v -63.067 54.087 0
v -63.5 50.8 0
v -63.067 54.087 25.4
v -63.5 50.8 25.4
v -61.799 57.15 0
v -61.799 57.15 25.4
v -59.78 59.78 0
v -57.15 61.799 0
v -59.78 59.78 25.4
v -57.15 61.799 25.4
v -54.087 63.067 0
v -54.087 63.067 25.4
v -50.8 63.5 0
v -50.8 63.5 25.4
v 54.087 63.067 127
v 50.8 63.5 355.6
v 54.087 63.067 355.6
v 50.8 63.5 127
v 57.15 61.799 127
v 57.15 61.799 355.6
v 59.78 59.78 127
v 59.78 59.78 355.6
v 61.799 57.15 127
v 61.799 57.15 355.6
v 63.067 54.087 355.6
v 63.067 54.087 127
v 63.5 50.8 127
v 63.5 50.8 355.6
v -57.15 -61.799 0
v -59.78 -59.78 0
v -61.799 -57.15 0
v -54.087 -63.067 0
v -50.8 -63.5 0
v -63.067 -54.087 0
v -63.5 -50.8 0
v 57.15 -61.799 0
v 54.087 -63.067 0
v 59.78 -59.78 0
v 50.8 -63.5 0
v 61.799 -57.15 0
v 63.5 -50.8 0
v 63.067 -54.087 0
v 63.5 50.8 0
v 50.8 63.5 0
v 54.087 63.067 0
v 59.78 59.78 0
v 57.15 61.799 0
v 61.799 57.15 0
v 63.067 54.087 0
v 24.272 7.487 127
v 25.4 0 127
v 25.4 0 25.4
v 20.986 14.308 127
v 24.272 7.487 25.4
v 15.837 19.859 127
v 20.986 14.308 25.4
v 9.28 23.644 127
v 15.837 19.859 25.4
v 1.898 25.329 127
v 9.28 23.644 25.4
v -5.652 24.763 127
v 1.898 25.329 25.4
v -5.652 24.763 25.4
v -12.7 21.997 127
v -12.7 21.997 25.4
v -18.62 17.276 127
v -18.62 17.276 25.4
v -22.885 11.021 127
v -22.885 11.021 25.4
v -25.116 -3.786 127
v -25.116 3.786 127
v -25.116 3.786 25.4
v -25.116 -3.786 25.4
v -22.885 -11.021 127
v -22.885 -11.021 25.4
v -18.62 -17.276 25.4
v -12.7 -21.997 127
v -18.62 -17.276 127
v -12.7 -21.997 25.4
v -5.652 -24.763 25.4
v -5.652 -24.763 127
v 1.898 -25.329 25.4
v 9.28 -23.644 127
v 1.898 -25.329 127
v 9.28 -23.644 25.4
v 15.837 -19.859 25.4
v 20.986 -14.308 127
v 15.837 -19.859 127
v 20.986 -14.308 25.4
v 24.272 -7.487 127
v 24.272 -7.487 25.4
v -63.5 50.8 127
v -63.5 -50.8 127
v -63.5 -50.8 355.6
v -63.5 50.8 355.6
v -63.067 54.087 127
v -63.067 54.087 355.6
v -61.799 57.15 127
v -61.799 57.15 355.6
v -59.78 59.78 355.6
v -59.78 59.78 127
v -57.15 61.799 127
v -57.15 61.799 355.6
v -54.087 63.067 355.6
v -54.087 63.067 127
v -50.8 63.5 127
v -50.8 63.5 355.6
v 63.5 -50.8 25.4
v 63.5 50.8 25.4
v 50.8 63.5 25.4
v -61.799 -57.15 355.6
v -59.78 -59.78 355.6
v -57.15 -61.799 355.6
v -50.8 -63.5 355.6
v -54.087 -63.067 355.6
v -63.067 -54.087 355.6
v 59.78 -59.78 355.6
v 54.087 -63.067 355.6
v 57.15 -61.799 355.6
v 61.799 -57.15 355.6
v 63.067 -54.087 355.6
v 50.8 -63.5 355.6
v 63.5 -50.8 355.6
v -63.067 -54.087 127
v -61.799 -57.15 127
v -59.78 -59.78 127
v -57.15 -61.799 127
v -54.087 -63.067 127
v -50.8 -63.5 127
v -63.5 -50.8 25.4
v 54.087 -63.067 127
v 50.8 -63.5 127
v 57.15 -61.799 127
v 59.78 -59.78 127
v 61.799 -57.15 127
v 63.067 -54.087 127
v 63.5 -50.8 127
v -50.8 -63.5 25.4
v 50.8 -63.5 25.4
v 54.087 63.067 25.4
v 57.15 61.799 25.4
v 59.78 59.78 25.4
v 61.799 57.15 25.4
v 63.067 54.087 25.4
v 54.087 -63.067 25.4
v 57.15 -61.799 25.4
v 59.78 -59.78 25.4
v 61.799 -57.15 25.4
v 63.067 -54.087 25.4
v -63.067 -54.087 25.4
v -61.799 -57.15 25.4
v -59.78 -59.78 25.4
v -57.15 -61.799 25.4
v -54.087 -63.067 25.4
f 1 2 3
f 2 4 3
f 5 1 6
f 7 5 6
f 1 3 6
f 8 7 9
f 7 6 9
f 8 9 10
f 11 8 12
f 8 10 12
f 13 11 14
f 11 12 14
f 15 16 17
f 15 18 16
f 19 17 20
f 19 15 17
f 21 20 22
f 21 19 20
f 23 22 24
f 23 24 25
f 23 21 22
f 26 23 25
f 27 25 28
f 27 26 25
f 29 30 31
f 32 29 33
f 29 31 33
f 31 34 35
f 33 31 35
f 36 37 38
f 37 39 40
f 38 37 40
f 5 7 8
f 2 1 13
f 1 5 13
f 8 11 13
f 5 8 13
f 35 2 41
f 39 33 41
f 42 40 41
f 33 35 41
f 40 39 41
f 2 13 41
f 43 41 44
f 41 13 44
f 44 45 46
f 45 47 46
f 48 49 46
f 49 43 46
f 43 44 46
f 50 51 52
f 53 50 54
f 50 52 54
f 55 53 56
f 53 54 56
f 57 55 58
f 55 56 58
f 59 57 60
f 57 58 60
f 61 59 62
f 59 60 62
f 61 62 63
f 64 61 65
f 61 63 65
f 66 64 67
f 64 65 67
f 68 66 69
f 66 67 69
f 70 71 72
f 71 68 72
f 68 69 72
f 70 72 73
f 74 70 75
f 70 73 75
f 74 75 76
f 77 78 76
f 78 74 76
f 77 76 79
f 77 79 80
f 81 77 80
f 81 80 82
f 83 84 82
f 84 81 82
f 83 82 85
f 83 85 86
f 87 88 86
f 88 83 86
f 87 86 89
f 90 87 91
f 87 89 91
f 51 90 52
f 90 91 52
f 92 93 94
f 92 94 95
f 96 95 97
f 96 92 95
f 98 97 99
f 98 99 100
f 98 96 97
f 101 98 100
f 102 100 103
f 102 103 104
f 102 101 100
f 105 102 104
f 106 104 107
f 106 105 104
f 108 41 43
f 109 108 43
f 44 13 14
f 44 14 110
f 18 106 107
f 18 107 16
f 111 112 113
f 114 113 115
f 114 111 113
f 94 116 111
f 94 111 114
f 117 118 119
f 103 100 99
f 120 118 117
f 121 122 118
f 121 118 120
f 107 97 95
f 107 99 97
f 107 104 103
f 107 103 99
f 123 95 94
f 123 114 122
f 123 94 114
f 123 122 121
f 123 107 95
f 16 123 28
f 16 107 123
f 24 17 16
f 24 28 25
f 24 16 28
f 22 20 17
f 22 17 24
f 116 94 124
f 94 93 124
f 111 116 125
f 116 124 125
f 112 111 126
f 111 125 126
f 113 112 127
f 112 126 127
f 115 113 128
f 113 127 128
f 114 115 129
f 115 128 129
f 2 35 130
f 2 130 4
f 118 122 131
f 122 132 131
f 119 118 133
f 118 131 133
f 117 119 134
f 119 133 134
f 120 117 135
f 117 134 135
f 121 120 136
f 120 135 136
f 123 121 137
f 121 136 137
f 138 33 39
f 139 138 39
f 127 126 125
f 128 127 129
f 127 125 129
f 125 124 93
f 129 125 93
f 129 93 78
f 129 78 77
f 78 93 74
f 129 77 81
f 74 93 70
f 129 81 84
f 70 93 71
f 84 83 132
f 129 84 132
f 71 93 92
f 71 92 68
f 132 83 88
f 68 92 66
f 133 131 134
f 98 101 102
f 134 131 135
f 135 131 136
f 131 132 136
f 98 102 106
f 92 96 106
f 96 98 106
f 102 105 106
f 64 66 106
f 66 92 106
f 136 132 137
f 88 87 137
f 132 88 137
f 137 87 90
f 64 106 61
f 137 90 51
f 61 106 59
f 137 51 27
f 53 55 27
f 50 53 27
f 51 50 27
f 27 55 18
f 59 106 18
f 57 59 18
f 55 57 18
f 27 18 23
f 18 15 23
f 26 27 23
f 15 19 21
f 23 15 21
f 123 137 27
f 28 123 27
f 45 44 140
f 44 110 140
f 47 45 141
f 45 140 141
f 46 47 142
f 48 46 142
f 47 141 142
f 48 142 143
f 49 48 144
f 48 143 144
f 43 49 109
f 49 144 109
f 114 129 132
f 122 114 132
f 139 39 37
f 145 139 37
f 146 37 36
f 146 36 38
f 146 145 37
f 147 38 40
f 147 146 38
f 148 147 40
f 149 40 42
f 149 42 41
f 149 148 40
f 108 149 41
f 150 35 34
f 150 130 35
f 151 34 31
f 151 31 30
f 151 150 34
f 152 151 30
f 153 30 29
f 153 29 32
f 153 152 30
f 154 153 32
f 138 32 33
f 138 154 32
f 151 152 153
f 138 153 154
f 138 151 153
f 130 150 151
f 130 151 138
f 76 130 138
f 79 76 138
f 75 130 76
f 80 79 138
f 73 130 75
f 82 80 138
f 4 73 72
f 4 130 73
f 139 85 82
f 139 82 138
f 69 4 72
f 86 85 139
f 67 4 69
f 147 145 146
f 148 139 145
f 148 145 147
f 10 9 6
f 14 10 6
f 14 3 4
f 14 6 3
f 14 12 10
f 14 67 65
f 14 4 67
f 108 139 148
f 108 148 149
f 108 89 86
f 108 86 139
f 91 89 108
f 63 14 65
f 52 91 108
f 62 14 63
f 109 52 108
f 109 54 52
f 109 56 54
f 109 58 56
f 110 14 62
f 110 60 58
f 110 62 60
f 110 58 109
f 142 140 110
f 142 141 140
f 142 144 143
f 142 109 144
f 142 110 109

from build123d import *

# Parameters (mm, degrees)
F0_W     = 127
F0_H     = 127
F0_R     = 25.4
F1_DEPTH = 25.4
F2_DEPTH = 355.6
F3_W     = 127
F3_H     = 127
F3_R     = 25.4
F4_DEPTH = 228.6
F5_R     = 12.7


with BuildPart() as f1:
    # F0 (on Top) → F1 (new body)
    with BuildSketch(Plane.XY):
        Rectangle(F0_W, F0_H)
        Circle(F0_R, mode=Mode.SUBTRACT)
    extrude(amount=F1_DEPTH)

    # F0 (on Top) → F2 (join)
    with BuildSketch(Plane.XY):
        Circle(F0_R)
    extrude(amount=F2_DEPTH)

    # F3 (on face) → F4 (join)
    with BuildSketch(Plane.XY.offset(355.6)):
        Rectangle(F3_W, F3_H)
        Circle(F3_R)
    extrude(amount=-F4_DEPTH)

    # F5
    f5_edges = [f1.edges().sort_by_distance(p)[0] for p in [
        (63.5, -63.5, 241.3),
        (63.5, 63.5, 241.3),
        (-63.5, -63.5, 241.3),
        (63.5, -63.5, 12.7),
        (63.5, 63.5, 12.7),
        (-63.5, -63.5, 12.7),
        (-63.5, 63.5, 241.3),
        (-63.5, 63.5, 12.7),
    ]]
    fillet(f5_edges, radius=F5_R)


solid = f1.part
